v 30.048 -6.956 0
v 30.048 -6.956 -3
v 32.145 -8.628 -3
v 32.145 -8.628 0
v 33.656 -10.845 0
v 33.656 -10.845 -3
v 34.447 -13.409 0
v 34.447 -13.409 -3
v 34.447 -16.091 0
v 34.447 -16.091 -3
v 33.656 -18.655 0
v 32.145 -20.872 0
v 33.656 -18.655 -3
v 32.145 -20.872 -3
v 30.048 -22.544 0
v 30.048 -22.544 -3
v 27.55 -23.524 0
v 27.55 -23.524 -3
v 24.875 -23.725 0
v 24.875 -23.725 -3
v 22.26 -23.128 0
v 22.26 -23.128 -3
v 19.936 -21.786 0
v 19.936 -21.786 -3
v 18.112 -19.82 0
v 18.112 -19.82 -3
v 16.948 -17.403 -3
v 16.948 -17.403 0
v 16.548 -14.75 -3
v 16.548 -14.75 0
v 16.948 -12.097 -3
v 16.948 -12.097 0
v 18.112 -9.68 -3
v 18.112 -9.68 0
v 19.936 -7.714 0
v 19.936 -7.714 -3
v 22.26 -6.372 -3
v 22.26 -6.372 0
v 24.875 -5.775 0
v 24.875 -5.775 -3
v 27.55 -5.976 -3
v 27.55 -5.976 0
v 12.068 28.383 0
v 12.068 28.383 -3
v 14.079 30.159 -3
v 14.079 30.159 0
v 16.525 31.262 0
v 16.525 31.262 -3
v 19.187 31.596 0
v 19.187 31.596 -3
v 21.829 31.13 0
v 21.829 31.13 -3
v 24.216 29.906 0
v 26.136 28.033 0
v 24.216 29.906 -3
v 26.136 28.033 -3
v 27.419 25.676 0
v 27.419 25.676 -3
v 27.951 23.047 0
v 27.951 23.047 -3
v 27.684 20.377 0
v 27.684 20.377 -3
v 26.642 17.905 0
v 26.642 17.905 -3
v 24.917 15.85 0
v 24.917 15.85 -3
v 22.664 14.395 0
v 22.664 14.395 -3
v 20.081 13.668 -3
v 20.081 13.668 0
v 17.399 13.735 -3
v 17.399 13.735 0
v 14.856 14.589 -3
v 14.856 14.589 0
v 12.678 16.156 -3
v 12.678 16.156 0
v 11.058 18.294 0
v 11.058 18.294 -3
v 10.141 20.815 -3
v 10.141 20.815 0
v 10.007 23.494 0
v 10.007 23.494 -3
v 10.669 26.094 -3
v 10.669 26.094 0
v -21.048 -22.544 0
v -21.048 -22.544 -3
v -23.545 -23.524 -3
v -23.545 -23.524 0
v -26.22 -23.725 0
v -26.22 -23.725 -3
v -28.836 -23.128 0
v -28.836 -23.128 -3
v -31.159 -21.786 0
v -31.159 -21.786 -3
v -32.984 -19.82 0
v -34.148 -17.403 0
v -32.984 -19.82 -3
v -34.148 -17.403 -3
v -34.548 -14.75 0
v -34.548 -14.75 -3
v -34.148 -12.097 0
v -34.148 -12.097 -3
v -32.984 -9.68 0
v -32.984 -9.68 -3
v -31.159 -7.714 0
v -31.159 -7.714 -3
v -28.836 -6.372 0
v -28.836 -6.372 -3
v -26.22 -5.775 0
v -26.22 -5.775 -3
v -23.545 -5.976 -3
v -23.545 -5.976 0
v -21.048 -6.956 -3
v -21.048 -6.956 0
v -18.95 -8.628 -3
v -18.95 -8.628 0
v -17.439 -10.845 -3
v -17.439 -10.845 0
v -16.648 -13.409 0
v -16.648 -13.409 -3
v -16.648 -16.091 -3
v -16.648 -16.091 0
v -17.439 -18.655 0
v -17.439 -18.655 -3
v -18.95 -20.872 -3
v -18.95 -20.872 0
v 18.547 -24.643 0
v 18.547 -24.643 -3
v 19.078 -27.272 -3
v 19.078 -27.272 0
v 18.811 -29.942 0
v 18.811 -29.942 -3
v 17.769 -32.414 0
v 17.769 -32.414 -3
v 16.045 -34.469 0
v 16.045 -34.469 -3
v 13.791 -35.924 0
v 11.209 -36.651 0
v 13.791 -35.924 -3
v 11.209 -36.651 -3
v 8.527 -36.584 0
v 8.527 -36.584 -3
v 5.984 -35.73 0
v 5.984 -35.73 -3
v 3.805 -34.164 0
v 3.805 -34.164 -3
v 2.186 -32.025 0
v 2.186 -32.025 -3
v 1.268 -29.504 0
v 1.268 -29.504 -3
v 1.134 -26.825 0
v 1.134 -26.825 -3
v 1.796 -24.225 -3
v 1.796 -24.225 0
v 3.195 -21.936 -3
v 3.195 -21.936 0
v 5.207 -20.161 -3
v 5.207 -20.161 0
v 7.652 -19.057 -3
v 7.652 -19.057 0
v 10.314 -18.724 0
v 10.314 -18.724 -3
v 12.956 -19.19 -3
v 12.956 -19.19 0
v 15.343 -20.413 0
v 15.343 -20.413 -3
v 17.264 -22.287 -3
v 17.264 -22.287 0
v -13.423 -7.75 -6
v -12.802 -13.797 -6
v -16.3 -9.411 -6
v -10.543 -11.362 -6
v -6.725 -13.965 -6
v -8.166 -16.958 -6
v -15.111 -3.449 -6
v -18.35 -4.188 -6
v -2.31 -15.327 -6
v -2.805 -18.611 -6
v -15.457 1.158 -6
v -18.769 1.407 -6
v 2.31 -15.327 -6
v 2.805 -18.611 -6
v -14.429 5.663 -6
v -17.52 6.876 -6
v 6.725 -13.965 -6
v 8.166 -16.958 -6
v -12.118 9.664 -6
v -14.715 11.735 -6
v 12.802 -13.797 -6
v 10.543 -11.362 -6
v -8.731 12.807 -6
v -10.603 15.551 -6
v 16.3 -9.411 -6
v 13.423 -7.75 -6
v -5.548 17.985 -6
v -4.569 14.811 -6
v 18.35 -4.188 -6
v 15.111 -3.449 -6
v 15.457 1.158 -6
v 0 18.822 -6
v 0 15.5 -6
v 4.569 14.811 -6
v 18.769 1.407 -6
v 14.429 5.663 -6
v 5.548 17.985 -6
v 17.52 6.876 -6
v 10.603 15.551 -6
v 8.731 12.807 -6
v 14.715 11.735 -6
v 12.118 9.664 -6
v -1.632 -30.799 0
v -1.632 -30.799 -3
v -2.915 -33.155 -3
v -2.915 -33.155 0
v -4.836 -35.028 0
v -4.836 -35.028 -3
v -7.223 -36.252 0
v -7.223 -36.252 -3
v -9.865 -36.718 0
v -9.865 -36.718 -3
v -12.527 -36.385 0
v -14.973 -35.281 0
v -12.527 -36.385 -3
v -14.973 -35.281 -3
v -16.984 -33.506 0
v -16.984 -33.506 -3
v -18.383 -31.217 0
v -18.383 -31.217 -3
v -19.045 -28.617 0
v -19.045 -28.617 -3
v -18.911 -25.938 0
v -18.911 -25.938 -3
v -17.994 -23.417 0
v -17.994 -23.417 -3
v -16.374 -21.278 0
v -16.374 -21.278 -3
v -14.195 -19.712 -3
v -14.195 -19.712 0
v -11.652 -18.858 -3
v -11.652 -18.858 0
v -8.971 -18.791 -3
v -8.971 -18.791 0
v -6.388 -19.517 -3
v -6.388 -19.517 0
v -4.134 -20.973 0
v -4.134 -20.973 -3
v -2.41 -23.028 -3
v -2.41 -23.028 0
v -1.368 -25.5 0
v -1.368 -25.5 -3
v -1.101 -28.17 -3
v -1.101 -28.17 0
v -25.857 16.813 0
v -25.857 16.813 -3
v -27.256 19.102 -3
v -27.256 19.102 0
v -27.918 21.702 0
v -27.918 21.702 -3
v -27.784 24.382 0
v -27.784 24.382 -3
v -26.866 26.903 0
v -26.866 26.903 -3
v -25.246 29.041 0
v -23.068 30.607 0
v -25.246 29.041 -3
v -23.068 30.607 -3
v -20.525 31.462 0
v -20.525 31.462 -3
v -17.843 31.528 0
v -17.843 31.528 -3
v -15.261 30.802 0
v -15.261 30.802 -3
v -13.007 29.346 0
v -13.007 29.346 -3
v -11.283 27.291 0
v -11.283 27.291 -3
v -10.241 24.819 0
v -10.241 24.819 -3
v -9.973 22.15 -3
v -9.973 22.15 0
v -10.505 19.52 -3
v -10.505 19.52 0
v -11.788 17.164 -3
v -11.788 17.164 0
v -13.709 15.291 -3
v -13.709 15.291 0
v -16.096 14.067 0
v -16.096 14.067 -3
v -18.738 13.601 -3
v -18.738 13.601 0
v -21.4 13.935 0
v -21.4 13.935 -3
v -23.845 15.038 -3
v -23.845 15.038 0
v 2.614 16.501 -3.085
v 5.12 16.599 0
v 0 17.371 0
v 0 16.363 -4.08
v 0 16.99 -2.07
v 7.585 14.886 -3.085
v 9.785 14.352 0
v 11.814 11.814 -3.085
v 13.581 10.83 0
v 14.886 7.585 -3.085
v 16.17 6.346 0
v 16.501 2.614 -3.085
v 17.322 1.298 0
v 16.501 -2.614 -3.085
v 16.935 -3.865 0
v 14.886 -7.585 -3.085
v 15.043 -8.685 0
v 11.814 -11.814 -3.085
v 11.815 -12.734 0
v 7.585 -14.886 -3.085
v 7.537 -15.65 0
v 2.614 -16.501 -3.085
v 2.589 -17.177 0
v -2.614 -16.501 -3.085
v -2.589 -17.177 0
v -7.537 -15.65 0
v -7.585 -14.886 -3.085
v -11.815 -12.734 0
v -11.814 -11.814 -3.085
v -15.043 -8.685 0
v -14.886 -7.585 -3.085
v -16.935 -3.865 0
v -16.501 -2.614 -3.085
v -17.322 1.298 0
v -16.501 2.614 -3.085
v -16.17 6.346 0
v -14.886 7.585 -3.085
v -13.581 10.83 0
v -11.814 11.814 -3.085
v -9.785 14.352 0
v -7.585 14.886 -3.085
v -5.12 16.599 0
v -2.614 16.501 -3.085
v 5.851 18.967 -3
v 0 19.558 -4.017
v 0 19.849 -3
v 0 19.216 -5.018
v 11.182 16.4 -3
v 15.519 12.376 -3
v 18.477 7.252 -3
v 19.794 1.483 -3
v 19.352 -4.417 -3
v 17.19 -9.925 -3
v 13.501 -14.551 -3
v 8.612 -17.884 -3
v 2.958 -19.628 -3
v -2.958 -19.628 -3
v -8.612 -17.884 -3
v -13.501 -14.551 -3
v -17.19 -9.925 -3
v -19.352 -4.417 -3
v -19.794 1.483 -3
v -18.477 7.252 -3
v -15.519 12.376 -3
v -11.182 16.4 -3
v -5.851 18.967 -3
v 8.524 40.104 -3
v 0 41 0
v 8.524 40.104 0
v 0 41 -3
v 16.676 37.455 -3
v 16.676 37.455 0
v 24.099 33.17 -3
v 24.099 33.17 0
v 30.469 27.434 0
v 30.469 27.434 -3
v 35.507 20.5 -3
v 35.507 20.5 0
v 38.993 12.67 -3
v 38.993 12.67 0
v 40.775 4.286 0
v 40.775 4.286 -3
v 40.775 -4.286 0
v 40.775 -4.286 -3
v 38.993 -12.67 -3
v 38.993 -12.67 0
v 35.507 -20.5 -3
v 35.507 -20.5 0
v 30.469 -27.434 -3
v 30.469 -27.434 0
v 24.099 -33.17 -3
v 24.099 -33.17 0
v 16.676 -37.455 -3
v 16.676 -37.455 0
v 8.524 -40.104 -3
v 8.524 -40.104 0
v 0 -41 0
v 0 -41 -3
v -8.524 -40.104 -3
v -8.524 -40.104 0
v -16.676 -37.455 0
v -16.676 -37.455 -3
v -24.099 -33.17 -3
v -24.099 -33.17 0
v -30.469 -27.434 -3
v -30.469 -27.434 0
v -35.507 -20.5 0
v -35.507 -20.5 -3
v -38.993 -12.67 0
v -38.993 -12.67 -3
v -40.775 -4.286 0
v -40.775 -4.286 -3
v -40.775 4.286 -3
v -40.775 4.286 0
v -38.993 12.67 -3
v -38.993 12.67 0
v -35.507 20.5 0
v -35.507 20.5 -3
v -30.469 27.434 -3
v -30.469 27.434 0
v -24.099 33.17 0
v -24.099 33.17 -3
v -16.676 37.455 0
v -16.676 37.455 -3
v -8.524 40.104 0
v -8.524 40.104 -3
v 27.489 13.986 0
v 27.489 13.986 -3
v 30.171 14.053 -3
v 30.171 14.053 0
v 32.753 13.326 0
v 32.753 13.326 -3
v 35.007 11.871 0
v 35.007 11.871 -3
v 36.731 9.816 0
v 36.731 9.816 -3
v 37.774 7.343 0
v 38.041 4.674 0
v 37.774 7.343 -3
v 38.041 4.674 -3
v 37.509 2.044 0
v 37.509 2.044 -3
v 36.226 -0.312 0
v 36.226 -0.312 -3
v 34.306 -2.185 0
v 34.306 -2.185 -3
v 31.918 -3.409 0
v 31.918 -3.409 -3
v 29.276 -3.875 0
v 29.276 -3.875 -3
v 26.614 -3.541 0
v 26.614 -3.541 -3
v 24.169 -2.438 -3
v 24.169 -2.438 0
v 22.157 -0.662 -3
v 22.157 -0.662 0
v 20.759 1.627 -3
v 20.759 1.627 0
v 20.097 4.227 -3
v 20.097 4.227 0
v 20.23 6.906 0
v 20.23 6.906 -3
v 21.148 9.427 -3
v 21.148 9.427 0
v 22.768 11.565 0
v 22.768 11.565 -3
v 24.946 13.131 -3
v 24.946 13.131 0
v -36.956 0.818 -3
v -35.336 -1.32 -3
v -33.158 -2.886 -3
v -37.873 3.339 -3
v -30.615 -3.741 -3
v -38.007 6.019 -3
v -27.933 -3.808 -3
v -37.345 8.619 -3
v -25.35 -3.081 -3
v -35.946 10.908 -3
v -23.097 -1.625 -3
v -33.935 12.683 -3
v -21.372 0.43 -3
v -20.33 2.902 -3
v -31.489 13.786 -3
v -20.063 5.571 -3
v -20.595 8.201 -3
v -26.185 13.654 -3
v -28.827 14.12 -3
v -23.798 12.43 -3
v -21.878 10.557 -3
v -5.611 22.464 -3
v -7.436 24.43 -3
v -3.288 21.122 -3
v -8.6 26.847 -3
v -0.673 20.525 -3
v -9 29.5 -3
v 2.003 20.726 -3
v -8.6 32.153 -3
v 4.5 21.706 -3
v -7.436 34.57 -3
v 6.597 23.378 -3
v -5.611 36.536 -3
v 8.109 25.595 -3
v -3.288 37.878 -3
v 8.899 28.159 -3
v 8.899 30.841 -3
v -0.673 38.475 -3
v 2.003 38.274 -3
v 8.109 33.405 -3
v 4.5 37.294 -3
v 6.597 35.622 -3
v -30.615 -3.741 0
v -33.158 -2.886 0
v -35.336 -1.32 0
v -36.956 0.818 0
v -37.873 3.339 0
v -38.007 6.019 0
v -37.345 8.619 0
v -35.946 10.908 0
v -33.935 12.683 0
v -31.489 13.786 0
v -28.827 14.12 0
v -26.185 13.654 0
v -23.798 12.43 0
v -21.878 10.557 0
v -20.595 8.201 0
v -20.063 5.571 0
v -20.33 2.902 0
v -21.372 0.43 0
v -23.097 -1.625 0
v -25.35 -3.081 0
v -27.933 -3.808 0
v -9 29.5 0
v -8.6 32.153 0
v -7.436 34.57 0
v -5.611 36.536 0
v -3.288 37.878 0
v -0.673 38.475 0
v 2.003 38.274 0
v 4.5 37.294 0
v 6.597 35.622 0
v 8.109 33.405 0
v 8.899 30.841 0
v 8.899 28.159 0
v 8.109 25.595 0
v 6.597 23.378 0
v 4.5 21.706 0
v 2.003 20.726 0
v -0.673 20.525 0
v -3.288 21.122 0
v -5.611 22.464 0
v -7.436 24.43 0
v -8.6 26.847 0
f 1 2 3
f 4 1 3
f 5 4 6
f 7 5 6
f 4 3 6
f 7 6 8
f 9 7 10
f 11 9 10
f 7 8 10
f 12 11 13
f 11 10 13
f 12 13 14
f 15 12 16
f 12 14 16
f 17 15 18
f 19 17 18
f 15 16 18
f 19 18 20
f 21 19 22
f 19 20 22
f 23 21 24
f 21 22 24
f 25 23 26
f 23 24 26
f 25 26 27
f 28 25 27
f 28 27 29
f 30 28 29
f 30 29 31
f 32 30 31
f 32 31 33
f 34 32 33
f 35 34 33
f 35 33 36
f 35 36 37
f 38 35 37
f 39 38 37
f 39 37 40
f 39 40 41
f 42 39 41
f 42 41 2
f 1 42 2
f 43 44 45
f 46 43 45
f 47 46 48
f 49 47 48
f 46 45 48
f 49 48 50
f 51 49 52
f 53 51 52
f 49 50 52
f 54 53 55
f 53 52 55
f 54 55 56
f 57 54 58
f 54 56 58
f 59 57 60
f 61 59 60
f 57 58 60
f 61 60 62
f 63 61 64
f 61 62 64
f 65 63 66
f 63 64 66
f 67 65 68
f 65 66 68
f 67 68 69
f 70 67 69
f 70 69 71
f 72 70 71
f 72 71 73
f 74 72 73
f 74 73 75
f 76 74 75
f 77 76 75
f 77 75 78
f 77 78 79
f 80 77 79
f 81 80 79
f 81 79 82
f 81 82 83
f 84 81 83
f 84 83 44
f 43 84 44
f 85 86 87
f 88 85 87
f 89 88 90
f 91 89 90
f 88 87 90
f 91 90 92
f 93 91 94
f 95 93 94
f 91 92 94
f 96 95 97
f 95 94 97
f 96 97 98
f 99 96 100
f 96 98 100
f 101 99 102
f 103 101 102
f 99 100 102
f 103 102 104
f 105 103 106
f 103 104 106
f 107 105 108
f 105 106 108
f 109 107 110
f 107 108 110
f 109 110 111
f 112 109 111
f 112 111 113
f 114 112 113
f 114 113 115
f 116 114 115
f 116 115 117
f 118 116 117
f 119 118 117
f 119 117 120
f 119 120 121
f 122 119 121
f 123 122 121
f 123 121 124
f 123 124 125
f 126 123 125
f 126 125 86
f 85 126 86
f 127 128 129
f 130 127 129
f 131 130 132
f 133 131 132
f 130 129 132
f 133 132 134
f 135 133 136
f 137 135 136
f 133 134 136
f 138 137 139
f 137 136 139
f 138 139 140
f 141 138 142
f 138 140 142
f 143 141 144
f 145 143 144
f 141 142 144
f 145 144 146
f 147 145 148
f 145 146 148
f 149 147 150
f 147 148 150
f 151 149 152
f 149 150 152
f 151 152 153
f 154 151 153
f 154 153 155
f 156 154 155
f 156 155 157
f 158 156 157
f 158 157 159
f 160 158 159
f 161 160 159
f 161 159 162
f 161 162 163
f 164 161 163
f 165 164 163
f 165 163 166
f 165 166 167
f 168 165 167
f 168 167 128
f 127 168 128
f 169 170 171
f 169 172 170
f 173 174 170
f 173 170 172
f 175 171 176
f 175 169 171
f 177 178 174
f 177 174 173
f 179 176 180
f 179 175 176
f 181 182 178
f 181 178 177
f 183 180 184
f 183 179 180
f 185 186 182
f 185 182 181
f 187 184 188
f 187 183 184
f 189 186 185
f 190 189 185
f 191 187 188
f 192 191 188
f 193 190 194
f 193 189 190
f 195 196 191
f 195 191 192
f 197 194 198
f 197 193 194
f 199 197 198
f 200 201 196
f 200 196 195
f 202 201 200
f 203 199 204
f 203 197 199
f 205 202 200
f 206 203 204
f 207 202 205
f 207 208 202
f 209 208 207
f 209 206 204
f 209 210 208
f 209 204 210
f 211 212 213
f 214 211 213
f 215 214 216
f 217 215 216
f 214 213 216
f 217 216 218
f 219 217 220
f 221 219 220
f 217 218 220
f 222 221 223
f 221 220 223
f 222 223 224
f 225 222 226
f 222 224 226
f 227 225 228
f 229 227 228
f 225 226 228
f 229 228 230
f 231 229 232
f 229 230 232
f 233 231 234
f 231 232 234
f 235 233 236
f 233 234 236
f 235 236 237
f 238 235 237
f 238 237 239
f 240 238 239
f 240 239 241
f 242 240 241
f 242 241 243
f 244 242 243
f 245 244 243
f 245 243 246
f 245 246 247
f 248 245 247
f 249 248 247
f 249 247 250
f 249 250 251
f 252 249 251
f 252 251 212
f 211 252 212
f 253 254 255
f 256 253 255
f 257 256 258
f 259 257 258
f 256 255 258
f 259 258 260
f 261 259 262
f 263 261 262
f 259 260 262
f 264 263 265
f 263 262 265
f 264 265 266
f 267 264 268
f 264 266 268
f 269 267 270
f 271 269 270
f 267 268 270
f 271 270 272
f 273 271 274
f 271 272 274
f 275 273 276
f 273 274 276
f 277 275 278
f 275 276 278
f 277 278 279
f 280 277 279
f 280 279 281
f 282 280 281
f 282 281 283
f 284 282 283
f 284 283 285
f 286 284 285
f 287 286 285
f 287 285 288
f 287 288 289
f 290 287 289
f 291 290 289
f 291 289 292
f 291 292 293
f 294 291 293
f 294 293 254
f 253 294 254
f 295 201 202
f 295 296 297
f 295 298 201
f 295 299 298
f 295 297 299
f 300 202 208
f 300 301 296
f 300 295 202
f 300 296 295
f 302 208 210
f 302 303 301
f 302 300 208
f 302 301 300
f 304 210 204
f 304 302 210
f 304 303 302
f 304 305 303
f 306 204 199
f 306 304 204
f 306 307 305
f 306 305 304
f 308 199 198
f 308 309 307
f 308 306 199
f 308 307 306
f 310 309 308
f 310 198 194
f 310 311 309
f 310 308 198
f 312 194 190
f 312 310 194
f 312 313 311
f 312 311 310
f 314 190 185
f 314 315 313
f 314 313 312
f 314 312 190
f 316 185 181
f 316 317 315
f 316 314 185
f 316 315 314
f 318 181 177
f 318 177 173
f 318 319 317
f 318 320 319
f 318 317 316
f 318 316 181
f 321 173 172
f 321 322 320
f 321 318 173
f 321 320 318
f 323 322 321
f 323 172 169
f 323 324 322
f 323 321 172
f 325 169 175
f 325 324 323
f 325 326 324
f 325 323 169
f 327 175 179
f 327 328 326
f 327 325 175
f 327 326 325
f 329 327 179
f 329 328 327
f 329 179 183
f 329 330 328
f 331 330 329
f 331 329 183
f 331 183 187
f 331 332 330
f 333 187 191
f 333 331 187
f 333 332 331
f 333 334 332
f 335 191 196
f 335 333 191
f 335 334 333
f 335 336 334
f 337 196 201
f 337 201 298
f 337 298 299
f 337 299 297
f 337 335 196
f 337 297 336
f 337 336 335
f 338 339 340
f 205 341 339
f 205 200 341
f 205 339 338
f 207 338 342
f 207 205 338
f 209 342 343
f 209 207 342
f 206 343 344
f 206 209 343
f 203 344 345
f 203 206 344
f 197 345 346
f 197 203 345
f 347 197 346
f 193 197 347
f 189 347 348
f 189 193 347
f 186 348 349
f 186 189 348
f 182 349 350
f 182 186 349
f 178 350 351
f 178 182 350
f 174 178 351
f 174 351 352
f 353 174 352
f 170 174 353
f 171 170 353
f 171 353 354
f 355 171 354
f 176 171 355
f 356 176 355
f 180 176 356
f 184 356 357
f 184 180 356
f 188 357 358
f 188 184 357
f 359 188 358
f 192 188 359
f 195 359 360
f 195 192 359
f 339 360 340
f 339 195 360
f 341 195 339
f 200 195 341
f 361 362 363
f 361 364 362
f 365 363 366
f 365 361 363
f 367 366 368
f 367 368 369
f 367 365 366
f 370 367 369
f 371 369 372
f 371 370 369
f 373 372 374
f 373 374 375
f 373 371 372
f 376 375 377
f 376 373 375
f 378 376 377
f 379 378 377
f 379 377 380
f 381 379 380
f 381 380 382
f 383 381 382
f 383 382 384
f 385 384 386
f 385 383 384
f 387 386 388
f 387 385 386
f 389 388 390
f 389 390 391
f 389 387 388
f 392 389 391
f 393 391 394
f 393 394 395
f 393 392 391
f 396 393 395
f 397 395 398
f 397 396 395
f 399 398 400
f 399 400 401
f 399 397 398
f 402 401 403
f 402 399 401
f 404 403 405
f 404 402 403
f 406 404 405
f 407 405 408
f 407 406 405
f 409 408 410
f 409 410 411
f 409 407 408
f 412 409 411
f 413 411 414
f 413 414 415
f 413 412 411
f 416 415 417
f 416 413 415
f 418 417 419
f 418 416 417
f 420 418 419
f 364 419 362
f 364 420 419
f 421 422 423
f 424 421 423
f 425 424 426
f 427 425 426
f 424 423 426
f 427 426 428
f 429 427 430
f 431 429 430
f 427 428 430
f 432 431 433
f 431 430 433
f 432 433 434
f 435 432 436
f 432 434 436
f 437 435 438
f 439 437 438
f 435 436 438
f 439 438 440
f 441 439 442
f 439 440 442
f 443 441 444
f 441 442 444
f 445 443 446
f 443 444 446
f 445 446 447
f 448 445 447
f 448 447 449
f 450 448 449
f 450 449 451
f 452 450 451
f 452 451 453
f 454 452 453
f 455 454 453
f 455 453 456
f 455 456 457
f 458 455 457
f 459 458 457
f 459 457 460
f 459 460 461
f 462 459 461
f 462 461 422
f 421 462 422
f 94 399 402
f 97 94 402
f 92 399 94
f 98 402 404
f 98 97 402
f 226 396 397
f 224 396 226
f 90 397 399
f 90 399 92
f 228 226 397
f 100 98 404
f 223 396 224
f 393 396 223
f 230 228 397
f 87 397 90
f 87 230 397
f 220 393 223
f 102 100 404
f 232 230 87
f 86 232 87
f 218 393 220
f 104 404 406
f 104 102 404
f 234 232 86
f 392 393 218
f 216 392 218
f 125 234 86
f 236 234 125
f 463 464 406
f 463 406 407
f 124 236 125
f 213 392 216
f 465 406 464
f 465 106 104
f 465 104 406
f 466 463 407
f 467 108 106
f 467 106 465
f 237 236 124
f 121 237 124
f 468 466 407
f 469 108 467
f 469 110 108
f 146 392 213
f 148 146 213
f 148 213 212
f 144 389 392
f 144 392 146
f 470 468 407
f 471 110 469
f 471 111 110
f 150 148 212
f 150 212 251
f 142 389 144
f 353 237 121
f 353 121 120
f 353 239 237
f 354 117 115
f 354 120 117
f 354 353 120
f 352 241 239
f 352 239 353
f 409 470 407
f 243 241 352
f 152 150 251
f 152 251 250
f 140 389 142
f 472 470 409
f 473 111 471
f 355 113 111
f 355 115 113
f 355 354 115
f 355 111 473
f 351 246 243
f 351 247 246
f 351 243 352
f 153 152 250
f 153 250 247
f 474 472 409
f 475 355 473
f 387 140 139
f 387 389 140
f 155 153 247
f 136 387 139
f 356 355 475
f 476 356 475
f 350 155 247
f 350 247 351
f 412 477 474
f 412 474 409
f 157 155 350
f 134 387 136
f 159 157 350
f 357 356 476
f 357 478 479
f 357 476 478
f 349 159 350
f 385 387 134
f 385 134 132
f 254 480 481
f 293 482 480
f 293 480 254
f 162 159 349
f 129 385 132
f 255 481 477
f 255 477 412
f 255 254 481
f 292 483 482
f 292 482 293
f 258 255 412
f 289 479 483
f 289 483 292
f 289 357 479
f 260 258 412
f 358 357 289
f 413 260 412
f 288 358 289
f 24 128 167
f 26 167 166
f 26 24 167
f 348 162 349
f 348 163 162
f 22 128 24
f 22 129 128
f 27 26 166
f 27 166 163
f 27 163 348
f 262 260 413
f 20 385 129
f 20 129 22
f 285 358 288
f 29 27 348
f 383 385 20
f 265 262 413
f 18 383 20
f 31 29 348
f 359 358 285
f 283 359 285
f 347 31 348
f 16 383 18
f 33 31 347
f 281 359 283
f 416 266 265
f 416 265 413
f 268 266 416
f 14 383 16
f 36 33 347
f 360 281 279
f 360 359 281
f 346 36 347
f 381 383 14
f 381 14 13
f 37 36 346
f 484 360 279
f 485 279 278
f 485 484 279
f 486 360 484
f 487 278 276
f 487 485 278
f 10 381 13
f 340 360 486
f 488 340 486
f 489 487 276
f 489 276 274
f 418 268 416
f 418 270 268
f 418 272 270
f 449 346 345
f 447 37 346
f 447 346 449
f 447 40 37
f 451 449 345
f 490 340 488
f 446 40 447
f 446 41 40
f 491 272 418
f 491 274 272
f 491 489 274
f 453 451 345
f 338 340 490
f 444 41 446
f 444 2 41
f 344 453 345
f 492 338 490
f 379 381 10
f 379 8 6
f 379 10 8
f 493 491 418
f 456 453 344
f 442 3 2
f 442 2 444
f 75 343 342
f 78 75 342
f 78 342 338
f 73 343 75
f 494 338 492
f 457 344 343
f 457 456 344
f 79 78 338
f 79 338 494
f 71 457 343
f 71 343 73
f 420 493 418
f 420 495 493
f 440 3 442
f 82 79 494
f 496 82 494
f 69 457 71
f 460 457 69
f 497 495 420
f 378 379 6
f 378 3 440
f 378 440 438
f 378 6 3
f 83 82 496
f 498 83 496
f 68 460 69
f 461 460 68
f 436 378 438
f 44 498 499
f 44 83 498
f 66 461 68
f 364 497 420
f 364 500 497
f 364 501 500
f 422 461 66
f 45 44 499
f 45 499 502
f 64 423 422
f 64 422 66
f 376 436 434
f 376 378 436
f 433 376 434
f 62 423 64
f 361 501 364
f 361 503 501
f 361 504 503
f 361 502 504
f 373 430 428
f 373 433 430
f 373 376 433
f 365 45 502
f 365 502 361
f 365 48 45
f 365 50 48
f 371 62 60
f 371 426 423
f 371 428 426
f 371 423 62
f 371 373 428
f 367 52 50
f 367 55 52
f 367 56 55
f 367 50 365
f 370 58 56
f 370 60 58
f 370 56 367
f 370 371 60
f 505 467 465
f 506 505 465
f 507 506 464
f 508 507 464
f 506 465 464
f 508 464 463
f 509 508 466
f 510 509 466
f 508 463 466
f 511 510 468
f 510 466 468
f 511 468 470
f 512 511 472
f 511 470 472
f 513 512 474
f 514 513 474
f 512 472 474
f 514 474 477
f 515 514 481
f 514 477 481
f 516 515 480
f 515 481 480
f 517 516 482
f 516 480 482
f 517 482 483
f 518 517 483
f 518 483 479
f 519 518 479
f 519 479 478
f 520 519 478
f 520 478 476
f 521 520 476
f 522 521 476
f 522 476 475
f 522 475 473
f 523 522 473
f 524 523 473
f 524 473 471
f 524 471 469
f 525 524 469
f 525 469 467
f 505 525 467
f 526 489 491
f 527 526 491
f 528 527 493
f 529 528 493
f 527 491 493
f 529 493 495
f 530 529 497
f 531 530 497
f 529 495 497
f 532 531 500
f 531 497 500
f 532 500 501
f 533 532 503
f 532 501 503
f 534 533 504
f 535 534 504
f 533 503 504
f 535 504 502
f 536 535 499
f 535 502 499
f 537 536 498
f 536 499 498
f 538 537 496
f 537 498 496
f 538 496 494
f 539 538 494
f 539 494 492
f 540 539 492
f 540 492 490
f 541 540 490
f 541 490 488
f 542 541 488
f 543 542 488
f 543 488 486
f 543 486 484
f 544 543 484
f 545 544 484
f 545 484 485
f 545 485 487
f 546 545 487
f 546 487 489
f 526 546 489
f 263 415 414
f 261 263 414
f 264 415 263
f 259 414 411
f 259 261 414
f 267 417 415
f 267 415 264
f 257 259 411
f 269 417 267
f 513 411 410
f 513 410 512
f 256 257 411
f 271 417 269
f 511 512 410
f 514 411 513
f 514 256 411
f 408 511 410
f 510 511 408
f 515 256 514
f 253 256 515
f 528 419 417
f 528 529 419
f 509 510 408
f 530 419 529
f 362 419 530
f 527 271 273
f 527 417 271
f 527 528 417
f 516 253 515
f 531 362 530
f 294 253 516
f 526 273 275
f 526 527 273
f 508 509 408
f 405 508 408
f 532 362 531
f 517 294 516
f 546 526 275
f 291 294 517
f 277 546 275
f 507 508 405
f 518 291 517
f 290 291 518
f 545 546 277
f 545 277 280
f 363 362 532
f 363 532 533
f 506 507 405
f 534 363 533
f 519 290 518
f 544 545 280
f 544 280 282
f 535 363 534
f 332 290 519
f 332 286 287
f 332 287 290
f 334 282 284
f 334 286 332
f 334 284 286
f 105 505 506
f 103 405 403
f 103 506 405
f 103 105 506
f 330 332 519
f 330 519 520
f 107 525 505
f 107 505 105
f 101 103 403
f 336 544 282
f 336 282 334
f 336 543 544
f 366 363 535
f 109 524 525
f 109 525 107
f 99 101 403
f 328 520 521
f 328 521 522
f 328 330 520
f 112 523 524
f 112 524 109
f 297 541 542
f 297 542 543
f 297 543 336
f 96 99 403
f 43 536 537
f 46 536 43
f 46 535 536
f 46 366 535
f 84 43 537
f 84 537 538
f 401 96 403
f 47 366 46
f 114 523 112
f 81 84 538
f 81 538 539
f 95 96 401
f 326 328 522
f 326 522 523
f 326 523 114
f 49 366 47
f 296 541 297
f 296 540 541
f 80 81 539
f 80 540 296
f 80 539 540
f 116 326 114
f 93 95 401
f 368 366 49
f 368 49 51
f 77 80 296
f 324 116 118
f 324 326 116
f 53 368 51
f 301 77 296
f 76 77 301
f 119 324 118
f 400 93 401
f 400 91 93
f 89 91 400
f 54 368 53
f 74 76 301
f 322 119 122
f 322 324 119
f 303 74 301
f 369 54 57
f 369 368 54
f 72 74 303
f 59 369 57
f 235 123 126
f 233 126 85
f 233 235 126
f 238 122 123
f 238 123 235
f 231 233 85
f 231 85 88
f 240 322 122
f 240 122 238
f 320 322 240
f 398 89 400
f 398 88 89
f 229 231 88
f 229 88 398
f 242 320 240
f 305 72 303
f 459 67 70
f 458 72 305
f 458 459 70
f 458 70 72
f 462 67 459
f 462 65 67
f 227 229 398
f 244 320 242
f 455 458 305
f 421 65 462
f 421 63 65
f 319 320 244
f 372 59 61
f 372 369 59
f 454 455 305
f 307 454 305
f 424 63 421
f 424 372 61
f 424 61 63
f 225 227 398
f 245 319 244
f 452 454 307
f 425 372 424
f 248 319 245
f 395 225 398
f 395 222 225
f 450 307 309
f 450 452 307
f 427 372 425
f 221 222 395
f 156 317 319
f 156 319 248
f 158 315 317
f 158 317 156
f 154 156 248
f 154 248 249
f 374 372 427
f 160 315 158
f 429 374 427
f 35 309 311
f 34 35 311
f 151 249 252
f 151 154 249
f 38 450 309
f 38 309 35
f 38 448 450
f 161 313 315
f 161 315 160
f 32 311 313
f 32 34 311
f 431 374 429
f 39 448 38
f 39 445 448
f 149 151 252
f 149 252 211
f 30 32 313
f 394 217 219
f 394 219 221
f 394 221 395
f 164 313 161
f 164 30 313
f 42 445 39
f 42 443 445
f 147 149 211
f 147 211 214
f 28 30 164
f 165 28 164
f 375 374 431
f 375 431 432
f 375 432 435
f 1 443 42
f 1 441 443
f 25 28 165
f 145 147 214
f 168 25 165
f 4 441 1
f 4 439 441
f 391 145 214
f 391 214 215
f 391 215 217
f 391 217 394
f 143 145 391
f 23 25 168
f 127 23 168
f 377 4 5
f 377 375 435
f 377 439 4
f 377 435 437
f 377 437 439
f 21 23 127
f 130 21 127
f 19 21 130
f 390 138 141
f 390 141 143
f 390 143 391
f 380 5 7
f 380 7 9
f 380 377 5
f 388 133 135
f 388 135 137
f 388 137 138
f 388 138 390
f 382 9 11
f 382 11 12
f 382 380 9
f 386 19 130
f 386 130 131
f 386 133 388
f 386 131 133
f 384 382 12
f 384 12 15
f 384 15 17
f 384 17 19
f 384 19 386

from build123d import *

# Parameters (mm, degrees)
SKETCH_5_R               = 9
CUT_EXTRUDE_1_DEPTH      = 59.060313468
PATTERN_CIRCULAR_1_COUNT = 9


with BuildPart() as part:
    # 草图4 → 旋转1 (revolve)
    with BuildSketch(Plane(origin=(0, 0, 0), x_dir=(0, 0, -1), z_dir=(1, 0, 0))):
        with BuildLine():
            Line((0, 17.370620624), (0, 41))
            Line((0, 41), (3, 41))
            Line((3, 41), (3, 19.849287907))
            ThreePointArc((3, 19.849287907), (4.519902914, 19.393505195), (6, 18.821530225))
            Line((6, 18.821530225), (6, 15.5))
            ThreePointArc((6, 15.5), (3.084663444, 16.706867601), (0, 17.370620624))
        make_face()
    revolve(axis=Axis((0, 0, 0), (0, 0, -1)))

    # 草图5 → 切除-拉伸1 (cut, through all)
    with BuildSketch(Plane(origin=(0, 0, -3), x_dir=(-1, 0, 0), z_dir=(0, 0, -1))):
        with Locations((0, 29.5)):
            Circle(SKETCH_5_R)
    cut_extrude_1 = extrude(amount=-CUT_EXTRUDE_1_DEPTH, mode=Mode.SUBTRACT)

    # 阵列(圆周)1: 切除-拉伸1 ×9 about axis
    pattern_circular_1_axis = Axis((0, 0, 0), (0, 0, 1))
    for i in range(1, PATTERN_CIRCULAR_1_COUNT):
        add(cut_extrude_1.rotate(pattern_circular_1_axis, i * 360 / PATTERN_CIRCULAR_1_COUNT), mode=Mode.SUBTRACT)


solid = part.part
